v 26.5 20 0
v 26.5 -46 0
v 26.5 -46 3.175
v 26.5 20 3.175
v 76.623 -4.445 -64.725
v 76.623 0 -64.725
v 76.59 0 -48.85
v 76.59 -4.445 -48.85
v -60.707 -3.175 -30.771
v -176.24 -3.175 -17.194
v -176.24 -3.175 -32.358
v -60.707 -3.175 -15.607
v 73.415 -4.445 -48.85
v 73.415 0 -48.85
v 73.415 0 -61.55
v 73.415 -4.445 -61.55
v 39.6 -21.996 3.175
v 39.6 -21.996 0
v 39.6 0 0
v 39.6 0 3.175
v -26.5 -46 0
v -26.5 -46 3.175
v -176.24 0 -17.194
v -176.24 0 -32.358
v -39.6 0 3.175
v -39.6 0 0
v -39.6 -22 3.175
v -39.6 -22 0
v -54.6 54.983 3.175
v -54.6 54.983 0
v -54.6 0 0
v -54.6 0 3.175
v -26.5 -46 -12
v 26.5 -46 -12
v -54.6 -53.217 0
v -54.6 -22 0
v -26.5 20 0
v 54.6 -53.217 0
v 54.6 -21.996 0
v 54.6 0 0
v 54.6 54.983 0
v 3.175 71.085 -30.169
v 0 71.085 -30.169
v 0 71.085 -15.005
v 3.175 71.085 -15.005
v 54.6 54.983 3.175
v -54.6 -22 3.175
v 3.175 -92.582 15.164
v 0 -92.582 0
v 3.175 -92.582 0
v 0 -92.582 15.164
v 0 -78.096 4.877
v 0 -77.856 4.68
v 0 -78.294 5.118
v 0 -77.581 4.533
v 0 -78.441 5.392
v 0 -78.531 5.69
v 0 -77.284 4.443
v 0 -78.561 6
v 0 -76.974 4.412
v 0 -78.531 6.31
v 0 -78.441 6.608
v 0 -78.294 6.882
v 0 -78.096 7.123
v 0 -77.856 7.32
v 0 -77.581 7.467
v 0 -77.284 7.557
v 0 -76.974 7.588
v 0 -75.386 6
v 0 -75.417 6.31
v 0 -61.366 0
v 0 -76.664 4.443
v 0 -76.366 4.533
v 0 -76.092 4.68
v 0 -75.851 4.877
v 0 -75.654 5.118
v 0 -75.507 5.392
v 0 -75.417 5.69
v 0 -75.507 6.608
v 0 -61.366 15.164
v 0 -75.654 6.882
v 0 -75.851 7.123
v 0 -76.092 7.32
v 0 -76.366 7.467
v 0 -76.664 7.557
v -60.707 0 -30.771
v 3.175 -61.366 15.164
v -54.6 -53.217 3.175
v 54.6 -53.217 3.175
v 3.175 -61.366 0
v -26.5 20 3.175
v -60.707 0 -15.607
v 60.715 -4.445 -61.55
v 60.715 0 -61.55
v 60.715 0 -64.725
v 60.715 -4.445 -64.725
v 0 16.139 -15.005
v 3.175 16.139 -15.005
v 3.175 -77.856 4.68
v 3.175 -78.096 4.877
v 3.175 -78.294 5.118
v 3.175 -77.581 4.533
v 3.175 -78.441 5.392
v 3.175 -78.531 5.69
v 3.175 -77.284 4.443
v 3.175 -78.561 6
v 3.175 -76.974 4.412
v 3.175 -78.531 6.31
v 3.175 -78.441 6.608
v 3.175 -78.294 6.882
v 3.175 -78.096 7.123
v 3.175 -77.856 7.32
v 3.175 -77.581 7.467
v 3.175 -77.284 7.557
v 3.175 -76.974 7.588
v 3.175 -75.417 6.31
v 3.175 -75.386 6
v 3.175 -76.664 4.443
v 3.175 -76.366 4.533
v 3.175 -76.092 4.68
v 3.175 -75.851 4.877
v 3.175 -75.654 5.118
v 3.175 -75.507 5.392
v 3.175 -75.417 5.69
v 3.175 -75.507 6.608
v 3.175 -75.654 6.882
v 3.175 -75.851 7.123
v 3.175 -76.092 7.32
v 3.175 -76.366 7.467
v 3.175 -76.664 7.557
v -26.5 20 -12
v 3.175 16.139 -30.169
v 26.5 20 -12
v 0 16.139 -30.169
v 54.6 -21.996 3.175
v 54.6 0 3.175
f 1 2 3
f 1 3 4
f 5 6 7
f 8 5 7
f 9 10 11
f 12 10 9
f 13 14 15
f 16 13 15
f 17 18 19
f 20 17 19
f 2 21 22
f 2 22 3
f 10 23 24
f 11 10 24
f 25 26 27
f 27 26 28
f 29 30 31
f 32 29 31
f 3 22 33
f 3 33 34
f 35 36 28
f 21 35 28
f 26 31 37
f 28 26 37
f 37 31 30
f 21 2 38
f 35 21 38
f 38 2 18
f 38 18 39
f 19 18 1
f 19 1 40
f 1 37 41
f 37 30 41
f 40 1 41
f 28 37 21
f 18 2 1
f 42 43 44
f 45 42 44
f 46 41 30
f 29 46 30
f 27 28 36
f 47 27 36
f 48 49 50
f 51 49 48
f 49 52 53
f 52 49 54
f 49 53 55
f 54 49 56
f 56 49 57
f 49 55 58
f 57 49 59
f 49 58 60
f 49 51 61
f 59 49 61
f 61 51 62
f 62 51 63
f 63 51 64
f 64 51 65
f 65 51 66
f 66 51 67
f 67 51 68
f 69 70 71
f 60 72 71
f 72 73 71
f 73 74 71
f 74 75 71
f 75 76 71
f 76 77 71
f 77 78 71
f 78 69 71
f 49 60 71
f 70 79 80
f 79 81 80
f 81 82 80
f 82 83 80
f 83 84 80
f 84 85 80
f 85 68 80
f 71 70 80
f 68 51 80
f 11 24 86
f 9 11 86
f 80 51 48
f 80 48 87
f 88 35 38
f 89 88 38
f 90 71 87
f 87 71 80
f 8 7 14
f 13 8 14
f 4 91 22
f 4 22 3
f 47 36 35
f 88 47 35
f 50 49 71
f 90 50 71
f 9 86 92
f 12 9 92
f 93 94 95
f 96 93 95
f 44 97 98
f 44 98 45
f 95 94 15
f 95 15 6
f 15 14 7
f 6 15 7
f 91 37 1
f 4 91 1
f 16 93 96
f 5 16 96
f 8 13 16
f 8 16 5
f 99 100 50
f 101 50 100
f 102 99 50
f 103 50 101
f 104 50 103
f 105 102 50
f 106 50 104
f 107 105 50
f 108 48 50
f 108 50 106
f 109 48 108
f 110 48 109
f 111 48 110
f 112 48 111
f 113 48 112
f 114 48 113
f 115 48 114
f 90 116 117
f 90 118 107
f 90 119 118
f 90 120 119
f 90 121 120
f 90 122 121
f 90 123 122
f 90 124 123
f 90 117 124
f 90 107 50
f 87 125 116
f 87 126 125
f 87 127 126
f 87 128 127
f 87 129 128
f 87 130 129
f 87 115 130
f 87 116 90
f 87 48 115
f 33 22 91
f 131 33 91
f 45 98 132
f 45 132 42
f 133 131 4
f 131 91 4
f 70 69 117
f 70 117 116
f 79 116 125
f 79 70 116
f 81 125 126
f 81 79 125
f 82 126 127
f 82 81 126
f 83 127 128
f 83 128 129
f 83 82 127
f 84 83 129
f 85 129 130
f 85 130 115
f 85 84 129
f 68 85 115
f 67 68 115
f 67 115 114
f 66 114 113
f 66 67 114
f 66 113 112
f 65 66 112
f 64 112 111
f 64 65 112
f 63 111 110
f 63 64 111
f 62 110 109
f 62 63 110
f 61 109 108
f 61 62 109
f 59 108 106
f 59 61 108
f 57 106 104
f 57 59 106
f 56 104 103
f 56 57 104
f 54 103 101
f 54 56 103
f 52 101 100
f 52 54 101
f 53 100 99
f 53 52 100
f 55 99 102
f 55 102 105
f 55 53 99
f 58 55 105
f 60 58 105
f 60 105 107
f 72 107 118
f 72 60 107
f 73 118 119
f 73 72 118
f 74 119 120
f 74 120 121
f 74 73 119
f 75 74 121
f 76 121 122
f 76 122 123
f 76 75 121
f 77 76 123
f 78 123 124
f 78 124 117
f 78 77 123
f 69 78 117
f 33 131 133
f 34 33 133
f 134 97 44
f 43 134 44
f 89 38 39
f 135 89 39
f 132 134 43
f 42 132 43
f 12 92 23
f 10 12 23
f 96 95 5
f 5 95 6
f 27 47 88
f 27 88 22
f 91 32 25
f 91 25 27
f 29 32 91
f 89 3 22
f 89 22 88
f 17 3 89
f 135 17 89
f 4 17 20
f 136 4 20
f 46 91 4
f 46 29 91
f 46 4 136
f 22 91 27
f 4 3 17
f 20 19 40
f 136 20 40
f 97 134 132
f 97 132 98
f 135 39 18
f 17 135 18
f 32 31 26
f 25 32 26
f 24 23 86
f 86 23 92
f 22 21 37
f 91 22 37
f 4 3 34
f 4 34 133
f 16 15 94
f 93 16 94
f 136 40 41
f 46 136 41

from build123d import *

# Parameters (mm, degrees)
F0_W          = 53
F0_H          = 66
F3_DEPTH      = 3.175
F1_W          = 31.2166
F1_H          = 15.1638
F1_R          = 1.5875
F4_DEPTH      = 3.175
F1_W_2        = 54.9460835755
F5_DEPTH      = 3.175
F6_DEPTH      = 3.175
F7_DEPTH      = 3.175
F7_DEPTH_BACK = 12
F8_DEPTH      = 4.445


# Not quite as in the source:
# - a length typed as a fraction of an inch, garbled in the dataset ("3 / 203.2 mm" for 3/8 in), is restored


with BuildPart() as f3:
    # F0 (on Top) → F3 (new body)
    with BuildSketch(Plane.XY):
        Polygon((-54.5999980115, -22), (-54.5999980115, -53.2168401558), (54.5999980115, -53.2168401558), (54.5999980115, -21.9964), (39.5999980115, -21.9964), (39.5999980115, 0), (54.5999980115, 0), (54.5999980115, 54.9831558671), (-54.5999980115, 54.9831558671), (-54.5999980115, 0), (-39.5999980115, 0), (-39.5999980115, -22), align=None)
        with Locations((0, -13)):
            Rectangle(F0_W, F0_H, mode=Mode.SUBTRACT)
    extrude(amount=F3_DEPTH)


with BuildPart() as f4:
    # F1 (on Right) → F4 (new body)
    with BuildSketch(Plane.YZ):
        with Locations((-76.9739231968, 7.5819)):
            Rectangle(F1_W, F1_H)
        with Locations((-76.9739231968, 6)):
            Circle(F1_R, mode=Mode.SUBTRACT)
    extrude(amount=F4_DEPTH)


with BuildPart() as f5:
    # F1 (on Right) → F5 (new body)
    with BuildSketch(Plane.YZ):
        with Locations((43.6124540865, -22.5870617241)):
            Rectangle(F1_W_2, F1_H)
    extrude(amount=F5_DEPTH)


with BuildPart() as f6:
    # F2 (on Front) → F6 (new body)
    with BuildSketch(Plane.XZ):
        Polygon((-60.7066550265, -15.606769852), (-176.2403489556, -17.194269852), (-176.2403489556, -32.358069852), (-60.7066550265, -30.770569852), align=None)
    extrude(amount=F6_DEPTH)


with BuildPart() as f7:
    # F0 (on Top) → F7 (new body, two sides)
    with BuildSketch(Plane.XY) as f7_sk:
        with Locations((0, -13)):
            Rectangle(F0_W, F0_H)
    extrude(amount=F7_DEPTH)
    extrude(f7_sk.sketch, amount=-F7_DEPTH_BACK)


with BuildPart() as f8:
    # F2 (on Front) → F8 (new body)
    with BuildSketch(Plane.XZ):
        Polygon((76.5899116695, -48.8504437208), (73.4149116695, -48.8504437208), (73.4149116695, -61.5504437208), (60.7149116695, -61.5504437208), (60.7149116695, -64.7254437208), (76.6233354807, -64.7254437208), align=None)
    extrude(amount=F8_DEPTH)


solid = Compound([f3.part, f4.part, f5.part, f6.part, f7.part, f8.part])
